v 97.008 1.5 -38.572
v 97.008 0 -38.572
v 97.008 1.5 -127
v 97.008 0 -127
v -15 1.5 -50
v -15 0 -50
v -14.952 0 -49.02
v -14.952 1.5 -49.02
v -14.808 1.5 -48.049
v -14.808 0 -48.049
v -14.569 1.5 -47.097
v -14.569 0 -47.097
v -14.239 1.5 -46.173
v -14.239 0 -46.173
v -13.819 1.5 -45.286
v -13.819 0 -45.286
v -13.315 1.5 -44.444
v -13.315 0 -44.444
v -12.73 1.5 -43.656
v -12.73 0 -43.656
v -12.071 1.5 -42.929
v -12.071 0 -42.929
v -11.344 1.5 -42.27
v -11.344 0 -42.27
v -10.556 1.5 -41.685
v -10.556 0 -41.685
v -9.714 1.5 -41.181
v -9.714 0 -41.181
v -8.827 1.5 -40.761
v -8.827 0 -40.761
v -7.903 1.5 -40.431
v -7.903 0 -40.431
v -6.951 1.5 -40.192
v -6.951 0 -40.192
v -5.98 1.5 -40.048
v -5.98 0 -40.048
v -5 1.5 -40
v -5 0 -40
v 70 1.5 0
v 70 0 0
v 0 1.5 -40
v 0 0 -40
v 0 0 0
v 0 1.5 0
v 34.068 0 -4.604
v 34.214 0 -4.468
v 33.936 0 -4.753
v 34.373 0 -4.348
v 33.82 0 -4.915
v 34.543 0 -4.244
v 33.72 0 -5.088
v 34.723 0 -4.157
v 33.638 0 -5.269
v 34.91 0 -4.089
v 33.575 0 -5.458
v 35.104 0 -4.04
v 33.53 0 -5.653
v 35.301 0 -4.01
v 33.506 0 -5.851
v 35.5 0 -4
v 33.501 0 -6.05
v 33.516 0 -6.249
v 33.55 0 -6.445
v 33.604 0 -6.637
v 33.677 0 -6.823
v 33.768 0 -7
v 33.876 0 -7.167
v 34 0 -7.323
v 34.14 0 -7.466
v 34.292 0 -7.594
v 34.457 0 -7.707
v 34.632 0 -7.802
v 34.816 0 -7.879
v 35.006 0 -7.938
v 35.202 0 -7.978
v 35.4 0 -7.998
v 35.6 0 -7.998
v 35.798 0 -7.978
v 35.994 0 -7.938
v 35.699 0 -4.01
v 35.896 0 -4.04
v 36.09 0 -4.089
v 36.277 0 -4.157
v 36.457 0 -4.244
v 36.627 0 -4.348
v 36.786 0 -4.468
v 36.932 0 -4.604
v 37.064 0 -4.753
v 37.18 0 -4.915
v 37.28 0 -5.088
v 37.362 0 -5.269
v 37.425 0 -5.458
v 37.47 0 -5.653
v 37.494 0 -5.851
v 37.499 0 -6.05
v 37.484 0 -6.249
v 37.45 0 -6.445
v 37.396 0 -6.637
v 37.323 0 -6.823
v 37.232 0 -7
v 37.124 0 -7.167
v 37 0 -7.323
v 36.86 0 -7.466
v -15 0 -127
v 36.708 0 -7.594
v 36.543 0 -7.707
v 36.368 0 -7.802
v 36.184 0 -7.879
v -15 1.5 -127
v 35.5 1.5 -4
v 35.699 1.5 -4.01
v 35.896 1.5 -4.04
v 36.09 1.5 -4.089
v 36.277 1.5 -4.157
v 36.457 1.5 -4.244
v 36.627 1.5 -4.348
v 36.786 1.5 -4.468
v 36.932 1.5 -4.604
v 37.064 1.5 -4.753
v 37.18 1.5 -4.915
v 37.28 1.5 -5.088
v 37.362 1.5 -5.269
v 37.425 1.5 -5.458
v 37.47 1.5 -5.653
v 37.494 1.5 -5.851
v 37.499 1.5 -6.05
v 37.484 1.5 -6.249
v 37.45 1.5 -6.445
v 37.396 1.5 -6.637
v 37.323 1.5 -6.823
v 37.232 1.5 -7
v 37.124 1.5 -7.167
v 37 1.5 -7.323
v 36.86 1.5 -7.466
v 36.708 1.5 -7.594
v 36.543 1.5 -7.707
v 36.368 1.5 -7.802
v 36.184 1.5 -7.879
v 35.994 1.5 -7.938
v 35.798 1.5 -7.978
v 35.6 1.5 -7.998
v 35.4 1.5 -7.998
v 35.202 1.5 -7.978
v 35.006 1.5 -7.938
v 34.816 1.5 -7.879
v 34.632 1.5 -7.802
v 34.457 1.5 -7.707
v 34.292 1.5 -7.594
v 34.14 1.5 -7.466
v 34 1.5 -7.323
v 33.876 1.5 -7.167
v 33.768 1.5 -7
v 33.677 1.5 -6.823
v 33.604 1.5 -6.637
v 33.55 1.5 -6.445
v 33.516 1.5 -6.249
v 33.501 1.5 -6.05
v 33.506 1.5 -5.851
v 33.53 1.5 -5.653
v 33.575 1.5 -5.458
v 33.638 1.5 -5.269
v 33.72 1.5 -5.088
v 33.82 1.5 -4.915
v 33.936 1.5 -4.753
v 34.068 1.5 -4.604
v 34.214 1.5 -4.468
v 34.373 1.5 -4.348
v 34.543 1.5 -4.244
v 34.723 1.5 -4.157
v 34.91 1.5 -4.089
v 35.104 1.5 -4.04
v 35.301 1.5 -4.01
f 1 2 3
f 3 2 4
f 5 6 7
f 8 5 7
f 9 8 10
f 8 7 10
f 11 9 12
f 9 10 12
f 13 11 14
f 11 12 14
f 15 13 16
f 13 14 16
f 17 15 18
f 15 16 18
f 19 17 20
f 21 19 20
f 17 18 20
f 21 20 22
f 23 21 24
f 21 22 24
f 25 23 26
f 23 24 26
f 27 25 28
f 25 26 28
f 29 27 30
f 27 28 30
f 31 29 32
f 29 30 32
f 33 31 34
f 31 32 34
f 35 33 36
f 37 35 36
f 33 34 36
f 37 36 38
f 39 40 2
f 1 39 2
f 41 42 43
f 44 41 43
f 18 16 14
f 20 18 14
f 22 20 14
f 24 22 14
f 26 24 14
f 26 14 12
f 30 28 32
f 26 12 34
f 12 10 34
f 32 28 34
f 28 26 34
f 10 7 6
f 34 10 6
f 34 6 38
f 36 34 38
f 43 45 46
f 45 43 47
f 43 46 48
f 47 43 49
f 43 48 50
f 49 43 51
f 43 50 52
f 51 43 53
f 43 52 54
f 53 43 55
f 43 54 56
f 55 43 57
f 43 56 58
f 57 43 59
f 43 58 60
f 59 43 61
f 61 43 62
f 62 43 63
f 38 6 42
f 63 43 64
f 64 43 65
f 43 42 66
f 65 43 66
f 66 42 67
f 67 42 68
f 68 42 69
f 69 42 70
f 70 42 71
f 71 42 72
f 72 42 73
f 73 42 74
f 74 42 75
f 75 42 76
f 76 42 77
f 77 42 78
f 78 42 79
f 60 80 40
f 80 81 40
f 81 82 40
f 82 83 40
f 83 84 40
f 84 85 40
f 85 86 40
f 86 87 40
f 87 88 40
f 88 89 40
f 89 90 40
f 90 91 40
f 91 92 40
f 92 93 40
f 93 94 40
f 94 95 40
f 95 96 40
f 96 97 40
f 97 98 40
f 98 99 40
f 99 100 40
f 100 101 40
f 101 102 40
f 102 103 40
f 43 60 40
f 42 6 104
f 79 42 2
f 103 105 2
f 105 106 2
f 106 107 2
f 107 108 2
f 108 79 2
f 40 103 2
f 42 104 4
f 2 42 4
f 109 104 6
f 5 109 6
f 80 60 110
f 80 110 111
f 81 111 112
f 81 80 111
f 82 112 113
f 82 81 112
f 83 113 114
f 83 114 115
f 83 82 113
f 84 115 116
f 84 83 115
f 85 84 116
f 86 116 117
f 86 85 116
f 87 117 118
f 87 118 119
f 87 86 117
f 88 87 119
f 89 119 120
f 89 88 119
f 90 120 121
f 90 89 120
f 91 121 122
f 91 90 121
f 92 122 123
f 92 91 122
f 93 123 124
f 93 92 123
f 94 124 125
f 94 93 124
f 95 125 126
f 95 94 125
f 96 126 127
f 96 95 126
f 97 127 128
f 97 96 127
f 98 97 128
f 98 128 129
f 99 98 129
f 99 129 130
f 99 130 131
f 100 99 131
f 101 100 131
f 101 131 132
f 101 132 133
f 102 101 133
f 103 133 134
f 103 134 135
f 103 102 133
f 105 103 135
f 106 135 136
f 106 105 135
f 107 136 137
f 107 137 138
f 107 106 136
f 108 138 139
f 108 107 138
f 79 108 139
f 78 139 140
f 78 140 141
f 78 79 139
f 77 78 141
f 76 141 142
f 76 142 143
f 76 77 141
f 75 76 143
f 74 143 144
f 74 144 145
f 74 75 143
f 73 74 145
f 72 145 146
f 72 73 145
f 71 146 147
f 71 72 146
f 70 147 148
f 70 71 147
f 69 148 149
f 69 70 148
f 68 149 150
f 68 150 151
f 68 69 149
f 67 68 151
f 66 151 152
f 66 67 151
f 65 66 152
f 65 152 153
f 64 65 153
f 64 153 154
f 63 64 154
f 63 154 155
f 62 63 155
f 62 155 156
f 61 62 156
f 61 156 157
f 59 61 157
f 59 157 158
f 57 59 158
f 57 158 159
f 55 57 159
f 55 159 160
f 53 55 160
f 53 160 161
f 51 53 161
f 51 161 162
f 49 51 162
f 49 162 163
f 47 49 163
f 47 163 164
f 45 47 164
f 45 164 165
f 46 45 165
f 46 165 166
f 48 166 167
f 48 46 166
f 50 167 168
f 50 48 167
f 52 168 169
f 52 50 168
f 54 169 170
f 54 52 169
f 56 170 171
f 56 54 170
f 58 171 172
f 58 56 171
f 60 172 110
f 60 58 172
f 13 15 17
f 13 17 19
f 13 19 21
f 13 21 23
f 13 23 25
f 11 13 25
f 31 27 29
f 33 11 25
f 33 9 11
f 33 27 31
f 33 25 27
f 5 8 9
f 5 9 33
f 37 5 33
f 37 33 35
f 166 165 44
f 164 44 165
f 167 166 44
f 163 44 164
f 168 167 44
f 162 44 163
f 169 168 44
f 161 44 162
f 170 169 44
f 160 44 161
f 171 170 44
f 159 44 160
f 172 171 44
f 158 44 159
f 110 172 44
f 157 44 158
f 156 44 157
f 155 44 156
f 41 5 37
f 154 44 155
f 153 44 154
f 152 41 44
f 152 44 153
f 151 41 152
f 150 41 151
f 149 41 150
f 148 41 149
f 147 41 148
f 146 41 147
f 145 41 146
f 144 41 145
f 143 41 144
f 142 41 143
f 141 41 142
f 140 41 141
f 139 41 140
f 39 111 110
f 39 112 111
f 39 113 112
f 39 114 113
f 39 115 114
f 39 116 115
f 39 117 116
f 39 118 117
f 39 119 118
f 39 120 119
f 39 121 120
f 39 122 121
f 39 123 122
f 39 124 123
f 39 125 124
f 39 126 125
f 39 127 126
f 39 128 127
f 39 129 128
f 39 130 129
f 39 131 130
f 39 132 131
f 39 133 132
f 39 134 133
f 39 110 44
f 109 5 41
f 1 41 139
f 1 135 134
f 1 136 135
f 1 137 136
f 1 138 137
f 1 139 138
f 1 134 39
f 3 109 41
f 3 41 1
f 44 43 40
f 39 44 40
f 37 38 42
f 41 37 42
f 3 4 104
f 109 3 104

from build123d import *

# Parameters (mm, degrees)
IZIM15_R                    = 2
Y_KSEKLIK_EKSTR_ZYON1_DEPTH = 1.5


with BuildPart() as part:
    # Çizim15 → Yükseklik-Ekstrüzyon1 (new body)
    with BuildSketch(Plane(origin=(0, 0, 0), x_dir=(1, 0, 0), z_dir=(0, 1, 0))):
        with BuildLine():
            Line((0, 0), (70, 0))
            Line((70, 0), (97.008301528, 38.571851993))
            Line((97.008301528, 38.571851993), (97.008301528, 127))
            Line((97.008301528, 127), (-15, 127))
            Line((-15, 127), (-15, 55))
            Line((-15, 55), (-15, 50))
            ThreePointArc((-15, 50), (-12.071067812, 42.928932188), (-5, 40))
            Line((-5, 40), (0, 40))
            Line((0, 40), (0, 0))
        make_face()
        with Locations(Location((35.5, 6, 0), (0, 0, 270))):
            Circle(IZIM15_R, mode=Mode.SUBTRACT)
    extrude(amount=Y_KSEKLIK_EKSTR_ZYON1_DEPTH)


solid = part.part
